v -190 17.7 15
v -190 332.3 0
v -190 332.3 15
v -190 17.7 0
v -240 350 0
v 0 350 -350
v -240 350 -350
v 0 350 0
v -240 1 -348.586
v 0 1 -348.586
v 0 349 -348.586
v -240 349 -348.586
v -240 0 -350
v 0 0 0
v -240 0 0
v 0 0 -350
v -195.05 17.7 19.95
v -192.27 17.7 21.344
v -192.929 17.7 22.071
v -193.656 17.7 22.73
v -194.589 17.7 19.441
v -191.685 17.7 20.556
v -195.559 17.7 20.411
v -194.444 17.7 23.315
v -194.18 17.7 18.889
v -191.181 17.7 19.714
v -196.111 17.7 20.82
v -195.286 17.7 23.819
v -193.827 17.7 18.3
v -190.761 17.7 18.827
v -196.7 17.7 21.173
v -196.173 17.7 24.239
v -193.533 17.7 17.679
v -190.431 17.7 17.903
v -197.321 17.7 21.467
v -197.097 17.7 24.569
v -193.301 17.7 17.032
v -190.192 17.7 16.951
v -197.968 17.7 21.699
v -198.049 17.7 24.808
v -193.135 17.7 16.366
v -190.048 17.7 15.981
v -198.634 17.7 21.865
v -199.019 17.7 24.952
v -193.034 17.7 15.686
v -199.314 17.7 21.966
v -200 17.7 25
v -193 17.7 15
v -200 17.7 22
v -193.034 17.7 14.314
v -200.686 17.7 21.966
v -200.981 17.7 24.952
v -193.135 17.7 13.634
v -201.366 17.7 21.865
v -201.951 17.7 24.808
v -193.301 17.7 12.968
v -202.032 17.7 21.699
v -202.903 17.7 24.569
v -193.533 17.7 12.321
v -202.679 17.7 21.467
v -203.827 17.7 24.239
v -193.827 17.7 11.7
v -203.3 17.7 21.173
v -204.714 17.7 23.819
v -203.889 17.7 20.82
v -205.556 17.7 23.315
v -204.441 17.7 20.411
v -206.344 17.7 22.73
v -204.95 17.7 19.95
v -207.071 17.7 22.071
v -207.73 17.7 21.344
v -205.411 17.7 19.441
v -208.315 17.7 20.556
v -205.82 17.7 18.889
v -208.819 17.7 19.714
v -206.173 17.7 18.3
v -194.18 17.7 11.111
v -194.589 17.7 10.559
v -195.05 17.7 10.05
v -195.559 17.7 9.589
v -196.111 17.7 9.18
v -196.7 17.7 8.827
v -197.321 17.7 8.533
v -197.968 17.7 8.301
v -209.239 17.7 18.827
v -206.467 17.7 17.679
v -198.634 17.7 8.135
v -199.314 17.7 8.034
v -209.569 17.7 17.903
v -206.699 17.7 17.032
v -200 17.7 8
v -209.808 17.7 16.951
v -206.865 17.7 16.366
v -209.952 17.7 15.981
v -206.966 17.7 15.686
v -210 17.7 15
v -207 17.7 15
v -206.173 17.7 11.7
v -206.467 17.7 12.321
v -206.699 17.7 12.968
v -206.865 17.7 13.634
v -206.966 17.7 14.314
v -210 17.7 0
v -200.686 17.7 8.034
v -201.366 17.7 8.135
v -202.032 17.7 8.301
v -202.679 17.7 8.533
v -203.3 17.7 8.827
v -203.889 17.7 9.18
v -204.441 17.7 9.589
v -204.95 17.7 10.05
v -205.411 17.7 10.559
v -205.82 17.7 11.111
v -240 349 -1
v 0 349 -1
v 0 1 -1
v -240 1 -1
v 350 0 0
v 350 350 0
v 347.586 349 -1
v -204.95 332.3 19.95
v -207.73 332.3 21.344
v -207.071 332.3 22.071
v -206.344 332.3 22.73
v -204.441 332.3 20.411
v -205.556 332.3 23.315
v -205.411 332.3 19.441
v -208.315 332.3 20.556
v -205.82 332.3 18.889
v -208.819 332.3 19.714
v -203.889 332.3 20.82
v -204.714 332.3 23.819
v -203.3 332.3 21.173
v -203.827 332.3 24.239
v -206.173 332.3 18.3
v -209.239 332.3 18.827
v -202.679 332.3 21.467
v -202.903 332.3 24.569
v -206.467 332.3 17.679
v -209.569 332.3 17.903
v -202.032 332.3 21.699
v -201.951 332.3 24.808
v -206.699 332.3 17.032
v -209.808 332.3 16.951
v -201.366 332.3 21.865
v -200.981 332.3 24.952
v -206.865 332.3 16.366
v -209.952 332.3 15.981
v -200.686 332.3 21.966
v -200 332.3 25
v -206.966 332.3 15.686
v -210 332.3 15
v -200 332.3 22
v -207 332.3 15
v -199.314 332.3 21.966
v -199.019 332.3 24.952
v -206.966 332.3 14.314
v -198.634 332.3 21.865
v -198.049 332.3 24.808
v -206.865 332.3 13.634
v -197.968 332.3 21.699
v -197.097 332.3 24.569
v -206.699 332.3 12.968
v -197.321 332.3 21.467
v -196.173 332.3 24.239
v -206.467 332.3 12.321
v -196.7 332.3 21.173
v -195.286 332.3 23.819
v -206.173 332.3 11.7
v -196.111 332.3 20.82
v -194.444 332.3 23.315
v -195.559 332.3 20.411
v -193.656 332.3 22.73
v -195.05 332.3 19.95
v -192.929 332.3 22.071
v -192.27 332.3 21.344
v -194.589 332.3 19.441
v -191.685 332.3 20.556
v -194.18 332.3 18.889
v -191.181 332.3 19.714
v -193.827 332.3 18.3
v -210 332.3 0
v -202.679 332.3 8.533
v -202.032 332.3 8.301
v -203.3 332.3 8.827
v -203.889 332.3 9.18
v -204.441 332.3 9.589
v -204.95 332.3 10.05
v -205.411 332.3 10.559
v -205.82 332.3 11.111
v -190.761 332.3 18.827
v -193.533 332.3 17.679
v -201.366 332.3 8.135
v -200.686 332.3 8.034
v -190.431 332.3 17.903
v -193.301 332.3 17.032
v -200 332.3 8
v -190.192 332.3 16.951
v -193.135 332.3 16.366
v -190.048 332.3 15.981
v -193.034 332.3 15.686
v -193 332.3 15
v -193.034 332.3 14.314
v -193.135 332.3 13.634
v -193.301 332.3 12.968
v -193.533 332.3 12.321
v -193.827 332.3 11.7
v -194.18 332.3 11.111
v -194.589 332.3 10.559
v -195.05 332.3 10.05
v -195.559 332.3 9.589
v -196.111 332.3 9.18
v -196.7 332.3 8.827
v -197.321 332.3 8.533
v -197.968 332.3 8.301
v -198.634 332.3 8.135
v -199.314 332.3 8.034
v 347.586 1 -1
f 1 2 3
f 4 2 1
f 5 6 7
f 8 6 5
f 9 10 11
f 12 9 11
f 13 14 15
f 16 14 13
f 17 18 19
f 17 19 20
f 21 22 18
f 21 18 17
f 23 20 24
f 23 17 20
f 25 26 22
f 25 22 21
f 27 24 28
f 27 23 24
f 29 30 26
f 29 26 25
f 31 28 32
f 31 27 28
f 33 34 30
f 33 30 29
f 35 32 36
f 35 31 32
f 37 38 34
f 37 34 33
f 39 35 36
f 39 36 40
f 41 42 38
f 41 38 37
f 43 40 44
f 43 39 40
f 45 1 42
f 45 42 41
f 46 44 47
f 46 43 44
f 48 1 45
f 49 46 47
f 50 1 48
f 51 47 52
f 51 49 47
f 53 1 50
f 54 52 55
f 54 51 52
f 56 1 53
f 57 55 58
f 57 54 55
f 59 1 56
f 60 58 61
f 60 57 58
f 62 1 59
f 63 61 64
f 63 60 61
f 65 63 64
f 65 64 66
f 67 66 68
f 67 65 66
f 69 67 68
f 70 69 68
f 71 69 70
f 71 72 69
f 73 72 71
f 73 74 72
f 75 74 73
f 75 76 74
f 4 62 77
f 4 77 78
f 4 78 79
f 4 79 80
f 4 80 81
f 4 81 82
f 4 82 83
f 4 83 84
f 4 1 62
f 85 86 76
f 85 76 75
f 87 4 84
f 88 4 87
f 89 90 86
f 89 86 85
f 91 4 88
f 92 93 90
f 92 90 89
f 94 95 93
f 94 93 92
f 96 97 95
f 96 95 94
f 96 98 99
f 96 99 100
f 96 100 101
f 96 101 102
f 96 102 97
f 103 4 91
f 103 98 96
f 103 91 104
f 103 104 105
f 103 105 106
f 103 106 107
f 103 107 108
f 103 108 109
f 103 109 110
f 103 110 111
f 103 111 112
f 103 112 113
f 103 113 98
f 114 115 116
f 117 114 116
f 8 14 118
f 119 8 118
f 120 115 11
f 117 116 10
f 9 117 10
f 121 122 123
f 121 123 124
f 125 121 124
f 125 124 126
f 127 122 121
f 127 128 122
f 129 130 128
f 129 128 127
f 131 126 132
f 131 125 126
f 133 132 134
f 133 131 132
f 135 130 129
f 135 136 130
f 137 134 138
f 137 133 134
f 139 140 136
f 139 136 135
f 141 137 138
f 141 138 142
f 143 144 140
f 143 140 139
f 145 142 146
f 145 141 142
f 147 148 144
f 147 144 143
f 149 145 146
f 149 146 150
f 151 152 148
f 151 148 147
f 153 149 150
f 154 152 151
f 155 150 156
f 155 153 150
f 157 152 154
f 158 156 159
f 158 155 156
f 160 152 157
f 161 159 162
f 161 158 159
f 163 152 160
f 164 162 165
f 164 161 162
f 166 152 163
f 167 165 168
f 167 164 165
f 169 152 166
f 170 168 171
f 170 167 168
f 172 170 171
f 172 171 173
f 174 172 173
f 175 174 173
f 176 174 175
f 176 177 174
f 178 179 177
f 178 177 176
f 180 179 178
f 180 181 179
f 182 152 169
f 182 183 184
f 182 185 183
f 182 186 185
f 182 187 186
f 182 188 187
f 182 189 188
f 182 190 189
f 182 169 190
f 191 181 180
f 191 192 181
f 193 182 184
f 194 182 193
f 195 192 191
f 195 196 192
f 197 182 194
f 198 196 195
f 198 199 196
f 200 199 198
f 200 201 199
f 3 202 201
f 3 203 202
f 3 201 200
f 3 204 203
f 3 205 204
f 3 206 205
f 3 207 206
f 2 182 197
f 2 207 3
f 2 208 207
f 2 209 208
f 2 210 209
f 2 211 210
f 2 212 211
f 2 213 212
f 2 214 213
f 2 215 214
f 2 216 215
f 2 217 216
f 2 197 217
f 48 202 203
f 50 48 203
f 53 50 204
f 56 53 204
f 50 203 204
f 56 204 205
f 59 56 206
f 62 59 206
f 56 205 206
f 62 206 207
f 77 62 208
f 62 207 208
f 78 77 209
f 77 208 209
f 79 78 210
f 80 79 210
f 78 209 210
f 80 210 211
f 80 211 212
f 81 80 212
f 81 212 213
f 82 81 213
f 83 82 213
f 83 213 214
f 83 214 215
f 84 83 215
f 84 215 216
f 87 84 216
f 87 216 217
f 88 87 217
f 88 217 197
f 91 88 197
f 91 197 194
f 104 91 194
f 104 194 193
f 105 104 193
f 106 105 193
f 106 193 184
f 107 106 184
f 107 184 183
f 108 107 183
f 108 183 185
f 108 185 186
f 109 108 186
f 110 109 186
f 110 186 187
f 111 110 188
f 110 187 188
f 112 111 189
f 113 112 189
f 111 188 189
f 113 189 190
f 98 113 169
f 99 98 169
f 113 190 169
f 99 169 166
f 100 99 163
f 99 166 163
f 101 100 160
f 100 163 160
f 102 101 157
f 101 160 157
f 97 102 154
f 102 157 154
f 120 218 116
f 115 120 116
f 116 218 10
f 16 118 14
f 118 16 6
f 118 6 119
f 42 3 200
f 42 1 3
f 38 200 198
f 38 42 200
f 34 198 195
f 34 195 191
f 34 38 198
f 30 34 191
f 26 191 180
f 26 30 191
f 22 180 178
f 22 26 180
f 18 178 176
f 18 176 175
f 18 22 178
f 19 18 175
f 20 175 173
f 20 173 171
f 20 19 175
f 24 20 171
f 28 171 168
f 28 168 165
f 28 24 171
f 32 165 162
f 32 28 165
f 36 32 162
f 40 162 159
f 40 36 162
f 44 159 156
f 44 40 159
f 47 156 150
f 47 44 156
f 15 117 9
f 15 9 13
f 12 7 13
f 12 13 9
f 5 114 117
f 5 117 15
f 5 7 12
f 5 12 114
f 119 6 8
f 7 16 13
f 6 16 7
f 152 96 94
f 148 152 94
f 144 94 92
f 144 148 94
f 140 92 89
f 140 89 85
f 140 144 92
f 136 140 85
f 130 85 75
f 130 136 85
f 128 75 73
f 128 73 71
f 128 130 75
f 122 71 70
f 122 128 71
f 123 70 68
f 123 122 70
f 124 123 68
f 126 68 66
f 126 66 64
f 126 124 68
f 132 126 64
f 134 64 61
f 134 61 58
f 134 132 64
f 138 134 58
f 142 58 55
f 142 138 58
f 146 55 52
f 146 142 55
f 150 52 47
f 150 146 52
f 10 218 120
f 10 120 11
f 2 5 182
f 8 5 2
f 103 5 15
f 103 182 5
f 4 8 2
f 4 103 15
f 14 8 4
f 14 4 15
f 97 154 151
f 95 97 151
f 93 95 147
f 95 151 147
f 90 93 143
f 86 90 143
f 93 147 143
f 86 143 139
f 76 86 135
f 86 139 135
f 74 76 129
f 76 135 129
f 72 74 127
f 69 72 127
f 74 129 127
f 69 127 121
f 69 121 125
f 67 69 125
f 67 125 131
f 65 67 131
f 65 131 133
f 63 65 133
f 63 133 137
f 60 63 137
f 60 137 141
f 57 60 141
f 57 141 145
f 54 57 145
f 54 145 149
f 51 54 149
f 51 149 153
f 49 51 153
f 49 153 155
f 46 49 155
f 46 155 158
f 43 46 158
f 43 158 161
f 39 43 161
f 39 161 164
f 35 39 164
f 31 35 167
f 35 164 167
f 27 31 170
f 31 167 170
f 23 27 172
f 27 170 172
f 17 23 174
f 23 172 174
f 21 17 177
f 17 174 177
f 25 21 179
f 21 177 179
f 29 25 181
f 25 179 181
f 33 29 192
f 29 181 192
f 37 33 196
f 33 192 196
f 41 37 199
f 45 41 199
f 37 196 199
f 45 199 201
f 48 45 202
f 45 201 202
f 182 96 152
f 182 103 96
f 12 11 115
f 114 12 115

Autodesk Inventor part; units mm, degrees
ref_plane "YZ Plane" through (0, 0, 0) normal (1, 0, 0) x (0, 1, 0)
ref_plane "XZ Plane" through (0, 0, 0) normal (0, 1, 0) x (-1, 0, 0)
ref_plane "XY Plane" through (0, 0, 0) normal (0, 0, 1) x (1, 0, 0)
sketch "Boceto1" plane through (0, 0, 0) normal (0, 1, 0) x (-1, 0, 0)
  line L0 (0, 0) -> (0, -350)
  line L1 (0, -350) -> (-350, 0)
  line L2 (-350, 0) -> (0, 0)
  dimension "d0" = 350
  dimension "d1" = 45
extrude "Extrusión1" add sketch "Boceto1" along normal blind 1
sketch "Boceto2" plane through (0, 1, 0) normal (0, 1, 0) x (1, 0, 0)
  line L0 (350, 0) -> (0, 350) projected
  line L1 (174.2929, 174.2929) -> (348.5858, 0)
  line L2 (0, 0) -> (350, 0) projected
  line L3 (174.2929, 174.2929) -> (420.7803, 174.2929) construction
  line L4 (348.5858, 1) -> (-0.0002, 1)
  line L5 (0, 350) -> (0, 0) projected
  line L6 (174.2929, 174.2929) -> (0, 348.5858)
  point P0 (347.5858, 1)
  point P1 (0, 1)
  dimension "d5" = 45
  dimension "d6" = 1
  dimension "d7" = 348.586
extrude "Extrusión2" add sketch "Boceto2" along normal blind 348 contours L2 L1 L6 L5 L0 | L2 L5 L4 L1
sketch "Boceto3" plane through (0, 349, 0) normal (0, 1, 0) x (1, 0, 0)
  line L0 (0, 350) -> (0, 0) projected
  line L1 (0, 0) -> (0, 350)
  line L2 (0, 0) -> (350, 0) projected
  line L3 (0, 350) -> (350, 0)
  line L4 (350, 0) -> (0, 0)
extrude "Extrusión3" add sketch "Boceto3" along normal blind 1
sketch "Boceto4" plane through (0, 0, -350) normal (-1, 0, 0) x (0, 0, 1)
  point P0 (350, 0)
sketch "Boceto5" plane through (0, 0, -350) normal (-1, 0, 0) x (0, 0, 1)
  line L0 (0, 0) -> (0, 350) projected
  line L1 (350, 0) -> (0, 0)
  line L2 (0, 0) -> (0, 350)
  line L3 (0, 350) -> (350, 350)
  line L4 (350, 350) -> (350, 0)
  line L5 (349, 1) -> (1.4142, 1) projected
  line L6 (1.4142, 1) -> (1.4142, 349) projected
  line L7 (349, 1) -> (1.4142, 1)
  line L8 (1.4142, 1) -> (1.4142, 349)
  line L9 (1.4142, 349) -> (349, 349)
  line L10 (349, 349) -> (349, 1)
extrude "Extrusión4" add sketch "Boceto5" along normal blind 240
sketch "Boceto6" plane through (350, 0, 0) normal (0, 0, 1) x (1, 0, 0)
  line L0 (-590, 0) -> (-590, 350) projected
  line L1 (-590, 350) -> (-560, 350)
  line L2 (-350, 349) -> (-590, 349) projected
  line L3 (-590, 350) -> (-560, 350) construction
  line L4 (-560, 350) -> (-560, 332.3)
  line L5 (-590, 0) -> (-560, 0)
  line L6 (-350, 1) -> (-590, 1) projected
  line L7 (-590, 0) -> (-560, 0) construction
  line L8 (-560, 0) -> (-560, 17.7)
  line L9 (-560, 332.3) -> (-540, 332.3)
  line L10 (-540, 332.3) -> (-540, 17.7)
  line L11 (-540, 17.7) -> (-560, 17.7)
  line L12 (-560, 17.7) -> (-560, 332.3)
  point P0 (-350, 0)
  dimension "d15" = 30
  dimension "d16" = 0
  dimension "d17" = 17.7
  dimension "d18" = 30
  dimension "d19" = 0
  dimension "d20" = 17.7
  dimension "d21" = 90
  dimension "d22" = 20
extrude "Extrusión5" add sketch "Boceto6" along normal blind 25 contours L12 L9 L10 L11
fillet "Empalme1" radius 10 2 edges at (-210, 175, 25) (-190, 175, 25)
sketch "Boceto8" plane through (-210, 332.3, 0) normal (0, 1, 0) x (1, 0, 0)
  line L0 (0, 0) -> (0, -15) projected
  line L1 (0, -15) -> (10, -15)
  circle A0 centre (10, -15) radius 7
  point P0 (210, 0)
  dimension "d29" = 10
  dimension "d30" = 14
extrude "Extrusión7" cut sketch "Boceto8" against normal blind 1000
properties part number "Cajon_ascensor_mejorsita"
